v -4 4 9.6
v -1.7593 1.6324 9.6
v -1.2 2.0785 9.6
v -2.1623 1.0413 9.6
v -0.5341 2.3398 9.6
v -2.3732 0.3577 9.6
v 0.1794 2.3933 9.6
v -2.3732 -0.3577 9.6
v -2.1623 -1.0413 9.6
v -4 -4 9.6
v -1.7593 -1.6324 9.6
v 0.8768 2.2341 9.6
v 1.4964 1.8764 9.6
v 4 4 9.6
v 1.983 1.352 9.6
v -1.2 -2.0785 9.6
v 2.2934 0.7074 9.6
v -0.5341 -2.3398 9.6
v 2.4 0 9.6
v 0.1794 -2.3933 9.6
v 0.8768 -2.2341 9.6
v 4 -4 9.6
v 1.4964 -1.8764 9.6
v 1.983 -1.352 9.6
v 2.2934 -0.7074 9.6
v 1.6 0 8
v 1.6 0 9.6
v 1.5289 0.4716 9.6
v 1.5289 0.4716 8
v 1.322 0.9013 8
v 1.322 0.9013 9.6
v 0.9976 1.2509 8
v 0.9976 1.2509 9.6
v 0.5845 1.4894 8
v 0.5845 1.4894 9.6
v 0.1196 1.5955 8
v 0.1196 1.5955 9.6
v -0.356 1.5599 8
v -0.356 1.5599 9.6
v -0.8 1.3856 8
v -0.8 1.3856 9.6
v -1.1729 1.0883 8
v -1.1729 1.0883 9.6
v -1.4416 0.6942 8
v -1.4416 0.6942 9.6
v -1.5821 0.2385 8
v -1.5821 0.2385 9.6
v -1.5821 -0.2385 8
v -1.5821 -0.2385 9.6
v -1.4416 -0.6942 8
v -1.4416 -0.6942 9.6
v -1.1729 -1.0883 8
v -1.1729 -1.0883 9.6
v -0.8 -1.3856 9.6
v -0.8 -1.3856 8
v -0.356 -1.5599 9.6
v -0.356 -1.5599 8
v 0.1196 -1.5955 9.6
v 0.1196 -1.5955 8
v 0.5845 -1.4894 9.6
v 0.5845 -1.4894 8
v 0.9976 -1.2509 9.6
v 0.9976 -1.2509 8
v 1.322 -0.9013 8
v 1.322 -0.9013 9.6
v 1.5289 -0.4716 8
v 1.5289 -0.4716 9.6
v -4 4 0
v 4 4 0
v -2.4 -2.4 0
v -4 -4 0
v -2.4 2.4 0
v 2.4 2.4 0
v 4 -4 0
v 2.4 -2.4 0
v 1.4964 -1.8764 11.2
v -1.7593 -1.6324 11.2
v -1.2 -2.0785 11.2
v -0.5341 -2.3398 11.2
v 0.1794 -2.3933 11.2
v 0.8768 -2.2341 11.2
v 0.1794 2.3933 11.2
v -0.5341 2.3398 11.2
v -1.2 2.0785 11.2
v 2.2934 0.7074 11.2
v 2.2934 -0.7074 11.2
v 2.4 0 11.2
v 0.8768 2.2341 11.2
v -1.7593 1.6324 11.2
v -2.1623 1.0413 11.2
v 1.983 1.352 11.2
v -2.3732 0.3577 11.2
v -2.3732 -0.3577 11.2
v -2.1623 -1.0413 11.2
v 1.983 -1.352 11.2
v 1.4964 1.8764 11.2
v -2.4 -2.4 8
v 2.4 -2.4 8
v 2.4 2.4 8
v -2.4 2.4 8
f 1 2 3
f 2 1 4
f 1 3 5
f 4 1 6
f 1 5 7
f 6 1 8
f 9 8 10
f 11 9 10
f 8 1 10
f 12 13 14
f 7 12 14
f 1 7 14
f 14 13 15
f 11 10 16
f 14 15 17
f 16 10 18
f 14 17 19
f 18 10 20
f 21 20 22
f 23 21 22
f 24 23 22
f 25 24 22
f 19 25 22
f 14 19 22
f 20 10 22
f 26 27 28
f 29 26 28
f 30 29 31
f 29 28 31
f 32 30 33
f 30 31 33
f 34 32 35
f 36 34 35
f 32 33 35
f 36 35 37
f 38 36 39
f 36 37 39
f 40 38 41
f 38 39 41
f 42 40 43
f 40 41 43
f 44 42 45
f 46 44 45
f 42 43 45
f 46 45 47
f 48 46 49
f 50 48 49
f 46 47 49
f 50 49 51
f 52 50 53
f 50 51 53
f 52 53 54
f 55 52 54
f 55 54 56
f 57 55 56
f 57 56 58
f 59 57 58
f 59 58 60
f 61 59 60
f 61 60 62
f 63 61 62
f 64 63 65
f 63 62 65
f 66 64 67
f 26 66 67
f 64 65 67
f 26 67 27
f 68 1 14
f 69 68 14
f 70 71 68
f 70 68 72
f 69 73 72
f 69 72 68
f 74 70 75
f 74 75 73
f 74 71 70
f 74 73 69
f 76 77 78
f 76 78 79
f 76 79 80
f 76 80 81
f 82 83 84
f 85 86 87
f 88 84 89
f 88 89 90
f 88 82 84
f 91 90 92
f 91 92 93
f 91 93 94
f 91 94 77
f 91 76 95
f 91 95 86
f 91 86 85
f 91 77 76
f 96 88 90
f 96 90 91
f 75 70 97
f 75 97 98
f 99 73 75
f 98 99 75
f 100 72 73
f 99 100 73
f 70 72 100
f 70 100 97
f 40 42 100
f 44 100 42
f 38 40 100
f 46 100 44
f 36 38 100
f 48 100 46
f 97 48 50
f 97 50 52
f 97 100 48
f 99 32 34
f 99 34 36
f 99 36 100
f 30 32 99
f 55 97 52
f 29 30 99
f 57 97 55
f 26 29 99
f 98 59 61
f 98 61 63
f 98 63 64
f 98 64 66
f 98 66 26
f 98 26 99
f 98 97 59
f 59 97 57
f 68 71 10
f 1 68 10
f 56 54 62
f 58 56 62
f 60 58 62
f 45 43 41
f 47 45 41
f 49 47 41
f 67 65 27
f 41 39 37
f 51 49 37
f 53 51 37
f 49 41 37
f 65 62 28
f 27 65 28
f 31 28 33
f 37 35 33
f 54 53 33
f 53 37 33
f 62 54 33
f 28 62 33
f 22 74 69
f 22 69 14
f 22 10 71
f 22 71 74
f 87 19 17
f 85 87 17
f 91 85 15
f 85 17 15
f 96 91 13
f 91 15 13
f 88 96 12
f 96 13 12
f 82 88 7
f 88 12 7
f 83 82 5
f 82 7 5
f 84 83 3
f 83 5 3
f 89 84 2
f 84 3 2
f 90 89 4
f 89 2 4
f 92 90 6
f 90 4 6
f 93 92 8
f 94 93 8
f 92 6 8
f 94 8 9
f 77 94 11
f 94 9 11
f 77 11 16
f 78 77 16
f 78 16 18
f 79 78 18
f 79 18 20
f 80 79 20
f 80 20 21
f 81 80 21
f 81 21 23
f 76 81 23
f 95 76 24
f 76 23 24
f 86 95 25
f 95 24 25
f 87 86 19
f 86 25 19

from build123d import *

# Parameters (mm, degrees)
F0_W     = 8
F0_H     = 9.6
F1_DEPTH = 4
F2_W     = 4.8
F2_H     = 4.8
F3_DEPTH = 8
F4_R     = 1.6
F5_DEPTH = 1.6
F6_R     = 2.4
F6_R_2   = 1.6
F7_DEPTH = 1.6


with BuildPart() as f1:
    # F0 (on Front) → F1 (new body, symmetric)
    with BuildSketch(Plane.XZ):
        with Locations((0, 4.8)):
            Rectangle(F0_W, F0_H)
    extrude(amount=F1_DEPTH, both=True)

    # F2 (on face) → F3 (cut)
    with BuildSketch(Plane(origin=(0, 0, 0), x_dir=(1, 0, 0), z_dir=(0, 0, -1))):
        Rectangle(F2_W, F2_H)
    extrude(amount=-F3_DEPTH, mode=Mode.SUBTRACT)

    # F4 (on face) → F5 (cut)
    with BuildSketch(Plane.XY.offset(9.6)):
        Circle(F4_R)
    extrude(amount=-F5_DEPTH, mode=Mode.SUBTRACT)

    # F6 (on face) → F7 (join)
    with BuildSketch(Plane.XY.offset(9.6)):
        Circle(F6_R)
        Circle(F6_R_2)
    extrude(amount=F7_DEPTH)


solid = f1.part
